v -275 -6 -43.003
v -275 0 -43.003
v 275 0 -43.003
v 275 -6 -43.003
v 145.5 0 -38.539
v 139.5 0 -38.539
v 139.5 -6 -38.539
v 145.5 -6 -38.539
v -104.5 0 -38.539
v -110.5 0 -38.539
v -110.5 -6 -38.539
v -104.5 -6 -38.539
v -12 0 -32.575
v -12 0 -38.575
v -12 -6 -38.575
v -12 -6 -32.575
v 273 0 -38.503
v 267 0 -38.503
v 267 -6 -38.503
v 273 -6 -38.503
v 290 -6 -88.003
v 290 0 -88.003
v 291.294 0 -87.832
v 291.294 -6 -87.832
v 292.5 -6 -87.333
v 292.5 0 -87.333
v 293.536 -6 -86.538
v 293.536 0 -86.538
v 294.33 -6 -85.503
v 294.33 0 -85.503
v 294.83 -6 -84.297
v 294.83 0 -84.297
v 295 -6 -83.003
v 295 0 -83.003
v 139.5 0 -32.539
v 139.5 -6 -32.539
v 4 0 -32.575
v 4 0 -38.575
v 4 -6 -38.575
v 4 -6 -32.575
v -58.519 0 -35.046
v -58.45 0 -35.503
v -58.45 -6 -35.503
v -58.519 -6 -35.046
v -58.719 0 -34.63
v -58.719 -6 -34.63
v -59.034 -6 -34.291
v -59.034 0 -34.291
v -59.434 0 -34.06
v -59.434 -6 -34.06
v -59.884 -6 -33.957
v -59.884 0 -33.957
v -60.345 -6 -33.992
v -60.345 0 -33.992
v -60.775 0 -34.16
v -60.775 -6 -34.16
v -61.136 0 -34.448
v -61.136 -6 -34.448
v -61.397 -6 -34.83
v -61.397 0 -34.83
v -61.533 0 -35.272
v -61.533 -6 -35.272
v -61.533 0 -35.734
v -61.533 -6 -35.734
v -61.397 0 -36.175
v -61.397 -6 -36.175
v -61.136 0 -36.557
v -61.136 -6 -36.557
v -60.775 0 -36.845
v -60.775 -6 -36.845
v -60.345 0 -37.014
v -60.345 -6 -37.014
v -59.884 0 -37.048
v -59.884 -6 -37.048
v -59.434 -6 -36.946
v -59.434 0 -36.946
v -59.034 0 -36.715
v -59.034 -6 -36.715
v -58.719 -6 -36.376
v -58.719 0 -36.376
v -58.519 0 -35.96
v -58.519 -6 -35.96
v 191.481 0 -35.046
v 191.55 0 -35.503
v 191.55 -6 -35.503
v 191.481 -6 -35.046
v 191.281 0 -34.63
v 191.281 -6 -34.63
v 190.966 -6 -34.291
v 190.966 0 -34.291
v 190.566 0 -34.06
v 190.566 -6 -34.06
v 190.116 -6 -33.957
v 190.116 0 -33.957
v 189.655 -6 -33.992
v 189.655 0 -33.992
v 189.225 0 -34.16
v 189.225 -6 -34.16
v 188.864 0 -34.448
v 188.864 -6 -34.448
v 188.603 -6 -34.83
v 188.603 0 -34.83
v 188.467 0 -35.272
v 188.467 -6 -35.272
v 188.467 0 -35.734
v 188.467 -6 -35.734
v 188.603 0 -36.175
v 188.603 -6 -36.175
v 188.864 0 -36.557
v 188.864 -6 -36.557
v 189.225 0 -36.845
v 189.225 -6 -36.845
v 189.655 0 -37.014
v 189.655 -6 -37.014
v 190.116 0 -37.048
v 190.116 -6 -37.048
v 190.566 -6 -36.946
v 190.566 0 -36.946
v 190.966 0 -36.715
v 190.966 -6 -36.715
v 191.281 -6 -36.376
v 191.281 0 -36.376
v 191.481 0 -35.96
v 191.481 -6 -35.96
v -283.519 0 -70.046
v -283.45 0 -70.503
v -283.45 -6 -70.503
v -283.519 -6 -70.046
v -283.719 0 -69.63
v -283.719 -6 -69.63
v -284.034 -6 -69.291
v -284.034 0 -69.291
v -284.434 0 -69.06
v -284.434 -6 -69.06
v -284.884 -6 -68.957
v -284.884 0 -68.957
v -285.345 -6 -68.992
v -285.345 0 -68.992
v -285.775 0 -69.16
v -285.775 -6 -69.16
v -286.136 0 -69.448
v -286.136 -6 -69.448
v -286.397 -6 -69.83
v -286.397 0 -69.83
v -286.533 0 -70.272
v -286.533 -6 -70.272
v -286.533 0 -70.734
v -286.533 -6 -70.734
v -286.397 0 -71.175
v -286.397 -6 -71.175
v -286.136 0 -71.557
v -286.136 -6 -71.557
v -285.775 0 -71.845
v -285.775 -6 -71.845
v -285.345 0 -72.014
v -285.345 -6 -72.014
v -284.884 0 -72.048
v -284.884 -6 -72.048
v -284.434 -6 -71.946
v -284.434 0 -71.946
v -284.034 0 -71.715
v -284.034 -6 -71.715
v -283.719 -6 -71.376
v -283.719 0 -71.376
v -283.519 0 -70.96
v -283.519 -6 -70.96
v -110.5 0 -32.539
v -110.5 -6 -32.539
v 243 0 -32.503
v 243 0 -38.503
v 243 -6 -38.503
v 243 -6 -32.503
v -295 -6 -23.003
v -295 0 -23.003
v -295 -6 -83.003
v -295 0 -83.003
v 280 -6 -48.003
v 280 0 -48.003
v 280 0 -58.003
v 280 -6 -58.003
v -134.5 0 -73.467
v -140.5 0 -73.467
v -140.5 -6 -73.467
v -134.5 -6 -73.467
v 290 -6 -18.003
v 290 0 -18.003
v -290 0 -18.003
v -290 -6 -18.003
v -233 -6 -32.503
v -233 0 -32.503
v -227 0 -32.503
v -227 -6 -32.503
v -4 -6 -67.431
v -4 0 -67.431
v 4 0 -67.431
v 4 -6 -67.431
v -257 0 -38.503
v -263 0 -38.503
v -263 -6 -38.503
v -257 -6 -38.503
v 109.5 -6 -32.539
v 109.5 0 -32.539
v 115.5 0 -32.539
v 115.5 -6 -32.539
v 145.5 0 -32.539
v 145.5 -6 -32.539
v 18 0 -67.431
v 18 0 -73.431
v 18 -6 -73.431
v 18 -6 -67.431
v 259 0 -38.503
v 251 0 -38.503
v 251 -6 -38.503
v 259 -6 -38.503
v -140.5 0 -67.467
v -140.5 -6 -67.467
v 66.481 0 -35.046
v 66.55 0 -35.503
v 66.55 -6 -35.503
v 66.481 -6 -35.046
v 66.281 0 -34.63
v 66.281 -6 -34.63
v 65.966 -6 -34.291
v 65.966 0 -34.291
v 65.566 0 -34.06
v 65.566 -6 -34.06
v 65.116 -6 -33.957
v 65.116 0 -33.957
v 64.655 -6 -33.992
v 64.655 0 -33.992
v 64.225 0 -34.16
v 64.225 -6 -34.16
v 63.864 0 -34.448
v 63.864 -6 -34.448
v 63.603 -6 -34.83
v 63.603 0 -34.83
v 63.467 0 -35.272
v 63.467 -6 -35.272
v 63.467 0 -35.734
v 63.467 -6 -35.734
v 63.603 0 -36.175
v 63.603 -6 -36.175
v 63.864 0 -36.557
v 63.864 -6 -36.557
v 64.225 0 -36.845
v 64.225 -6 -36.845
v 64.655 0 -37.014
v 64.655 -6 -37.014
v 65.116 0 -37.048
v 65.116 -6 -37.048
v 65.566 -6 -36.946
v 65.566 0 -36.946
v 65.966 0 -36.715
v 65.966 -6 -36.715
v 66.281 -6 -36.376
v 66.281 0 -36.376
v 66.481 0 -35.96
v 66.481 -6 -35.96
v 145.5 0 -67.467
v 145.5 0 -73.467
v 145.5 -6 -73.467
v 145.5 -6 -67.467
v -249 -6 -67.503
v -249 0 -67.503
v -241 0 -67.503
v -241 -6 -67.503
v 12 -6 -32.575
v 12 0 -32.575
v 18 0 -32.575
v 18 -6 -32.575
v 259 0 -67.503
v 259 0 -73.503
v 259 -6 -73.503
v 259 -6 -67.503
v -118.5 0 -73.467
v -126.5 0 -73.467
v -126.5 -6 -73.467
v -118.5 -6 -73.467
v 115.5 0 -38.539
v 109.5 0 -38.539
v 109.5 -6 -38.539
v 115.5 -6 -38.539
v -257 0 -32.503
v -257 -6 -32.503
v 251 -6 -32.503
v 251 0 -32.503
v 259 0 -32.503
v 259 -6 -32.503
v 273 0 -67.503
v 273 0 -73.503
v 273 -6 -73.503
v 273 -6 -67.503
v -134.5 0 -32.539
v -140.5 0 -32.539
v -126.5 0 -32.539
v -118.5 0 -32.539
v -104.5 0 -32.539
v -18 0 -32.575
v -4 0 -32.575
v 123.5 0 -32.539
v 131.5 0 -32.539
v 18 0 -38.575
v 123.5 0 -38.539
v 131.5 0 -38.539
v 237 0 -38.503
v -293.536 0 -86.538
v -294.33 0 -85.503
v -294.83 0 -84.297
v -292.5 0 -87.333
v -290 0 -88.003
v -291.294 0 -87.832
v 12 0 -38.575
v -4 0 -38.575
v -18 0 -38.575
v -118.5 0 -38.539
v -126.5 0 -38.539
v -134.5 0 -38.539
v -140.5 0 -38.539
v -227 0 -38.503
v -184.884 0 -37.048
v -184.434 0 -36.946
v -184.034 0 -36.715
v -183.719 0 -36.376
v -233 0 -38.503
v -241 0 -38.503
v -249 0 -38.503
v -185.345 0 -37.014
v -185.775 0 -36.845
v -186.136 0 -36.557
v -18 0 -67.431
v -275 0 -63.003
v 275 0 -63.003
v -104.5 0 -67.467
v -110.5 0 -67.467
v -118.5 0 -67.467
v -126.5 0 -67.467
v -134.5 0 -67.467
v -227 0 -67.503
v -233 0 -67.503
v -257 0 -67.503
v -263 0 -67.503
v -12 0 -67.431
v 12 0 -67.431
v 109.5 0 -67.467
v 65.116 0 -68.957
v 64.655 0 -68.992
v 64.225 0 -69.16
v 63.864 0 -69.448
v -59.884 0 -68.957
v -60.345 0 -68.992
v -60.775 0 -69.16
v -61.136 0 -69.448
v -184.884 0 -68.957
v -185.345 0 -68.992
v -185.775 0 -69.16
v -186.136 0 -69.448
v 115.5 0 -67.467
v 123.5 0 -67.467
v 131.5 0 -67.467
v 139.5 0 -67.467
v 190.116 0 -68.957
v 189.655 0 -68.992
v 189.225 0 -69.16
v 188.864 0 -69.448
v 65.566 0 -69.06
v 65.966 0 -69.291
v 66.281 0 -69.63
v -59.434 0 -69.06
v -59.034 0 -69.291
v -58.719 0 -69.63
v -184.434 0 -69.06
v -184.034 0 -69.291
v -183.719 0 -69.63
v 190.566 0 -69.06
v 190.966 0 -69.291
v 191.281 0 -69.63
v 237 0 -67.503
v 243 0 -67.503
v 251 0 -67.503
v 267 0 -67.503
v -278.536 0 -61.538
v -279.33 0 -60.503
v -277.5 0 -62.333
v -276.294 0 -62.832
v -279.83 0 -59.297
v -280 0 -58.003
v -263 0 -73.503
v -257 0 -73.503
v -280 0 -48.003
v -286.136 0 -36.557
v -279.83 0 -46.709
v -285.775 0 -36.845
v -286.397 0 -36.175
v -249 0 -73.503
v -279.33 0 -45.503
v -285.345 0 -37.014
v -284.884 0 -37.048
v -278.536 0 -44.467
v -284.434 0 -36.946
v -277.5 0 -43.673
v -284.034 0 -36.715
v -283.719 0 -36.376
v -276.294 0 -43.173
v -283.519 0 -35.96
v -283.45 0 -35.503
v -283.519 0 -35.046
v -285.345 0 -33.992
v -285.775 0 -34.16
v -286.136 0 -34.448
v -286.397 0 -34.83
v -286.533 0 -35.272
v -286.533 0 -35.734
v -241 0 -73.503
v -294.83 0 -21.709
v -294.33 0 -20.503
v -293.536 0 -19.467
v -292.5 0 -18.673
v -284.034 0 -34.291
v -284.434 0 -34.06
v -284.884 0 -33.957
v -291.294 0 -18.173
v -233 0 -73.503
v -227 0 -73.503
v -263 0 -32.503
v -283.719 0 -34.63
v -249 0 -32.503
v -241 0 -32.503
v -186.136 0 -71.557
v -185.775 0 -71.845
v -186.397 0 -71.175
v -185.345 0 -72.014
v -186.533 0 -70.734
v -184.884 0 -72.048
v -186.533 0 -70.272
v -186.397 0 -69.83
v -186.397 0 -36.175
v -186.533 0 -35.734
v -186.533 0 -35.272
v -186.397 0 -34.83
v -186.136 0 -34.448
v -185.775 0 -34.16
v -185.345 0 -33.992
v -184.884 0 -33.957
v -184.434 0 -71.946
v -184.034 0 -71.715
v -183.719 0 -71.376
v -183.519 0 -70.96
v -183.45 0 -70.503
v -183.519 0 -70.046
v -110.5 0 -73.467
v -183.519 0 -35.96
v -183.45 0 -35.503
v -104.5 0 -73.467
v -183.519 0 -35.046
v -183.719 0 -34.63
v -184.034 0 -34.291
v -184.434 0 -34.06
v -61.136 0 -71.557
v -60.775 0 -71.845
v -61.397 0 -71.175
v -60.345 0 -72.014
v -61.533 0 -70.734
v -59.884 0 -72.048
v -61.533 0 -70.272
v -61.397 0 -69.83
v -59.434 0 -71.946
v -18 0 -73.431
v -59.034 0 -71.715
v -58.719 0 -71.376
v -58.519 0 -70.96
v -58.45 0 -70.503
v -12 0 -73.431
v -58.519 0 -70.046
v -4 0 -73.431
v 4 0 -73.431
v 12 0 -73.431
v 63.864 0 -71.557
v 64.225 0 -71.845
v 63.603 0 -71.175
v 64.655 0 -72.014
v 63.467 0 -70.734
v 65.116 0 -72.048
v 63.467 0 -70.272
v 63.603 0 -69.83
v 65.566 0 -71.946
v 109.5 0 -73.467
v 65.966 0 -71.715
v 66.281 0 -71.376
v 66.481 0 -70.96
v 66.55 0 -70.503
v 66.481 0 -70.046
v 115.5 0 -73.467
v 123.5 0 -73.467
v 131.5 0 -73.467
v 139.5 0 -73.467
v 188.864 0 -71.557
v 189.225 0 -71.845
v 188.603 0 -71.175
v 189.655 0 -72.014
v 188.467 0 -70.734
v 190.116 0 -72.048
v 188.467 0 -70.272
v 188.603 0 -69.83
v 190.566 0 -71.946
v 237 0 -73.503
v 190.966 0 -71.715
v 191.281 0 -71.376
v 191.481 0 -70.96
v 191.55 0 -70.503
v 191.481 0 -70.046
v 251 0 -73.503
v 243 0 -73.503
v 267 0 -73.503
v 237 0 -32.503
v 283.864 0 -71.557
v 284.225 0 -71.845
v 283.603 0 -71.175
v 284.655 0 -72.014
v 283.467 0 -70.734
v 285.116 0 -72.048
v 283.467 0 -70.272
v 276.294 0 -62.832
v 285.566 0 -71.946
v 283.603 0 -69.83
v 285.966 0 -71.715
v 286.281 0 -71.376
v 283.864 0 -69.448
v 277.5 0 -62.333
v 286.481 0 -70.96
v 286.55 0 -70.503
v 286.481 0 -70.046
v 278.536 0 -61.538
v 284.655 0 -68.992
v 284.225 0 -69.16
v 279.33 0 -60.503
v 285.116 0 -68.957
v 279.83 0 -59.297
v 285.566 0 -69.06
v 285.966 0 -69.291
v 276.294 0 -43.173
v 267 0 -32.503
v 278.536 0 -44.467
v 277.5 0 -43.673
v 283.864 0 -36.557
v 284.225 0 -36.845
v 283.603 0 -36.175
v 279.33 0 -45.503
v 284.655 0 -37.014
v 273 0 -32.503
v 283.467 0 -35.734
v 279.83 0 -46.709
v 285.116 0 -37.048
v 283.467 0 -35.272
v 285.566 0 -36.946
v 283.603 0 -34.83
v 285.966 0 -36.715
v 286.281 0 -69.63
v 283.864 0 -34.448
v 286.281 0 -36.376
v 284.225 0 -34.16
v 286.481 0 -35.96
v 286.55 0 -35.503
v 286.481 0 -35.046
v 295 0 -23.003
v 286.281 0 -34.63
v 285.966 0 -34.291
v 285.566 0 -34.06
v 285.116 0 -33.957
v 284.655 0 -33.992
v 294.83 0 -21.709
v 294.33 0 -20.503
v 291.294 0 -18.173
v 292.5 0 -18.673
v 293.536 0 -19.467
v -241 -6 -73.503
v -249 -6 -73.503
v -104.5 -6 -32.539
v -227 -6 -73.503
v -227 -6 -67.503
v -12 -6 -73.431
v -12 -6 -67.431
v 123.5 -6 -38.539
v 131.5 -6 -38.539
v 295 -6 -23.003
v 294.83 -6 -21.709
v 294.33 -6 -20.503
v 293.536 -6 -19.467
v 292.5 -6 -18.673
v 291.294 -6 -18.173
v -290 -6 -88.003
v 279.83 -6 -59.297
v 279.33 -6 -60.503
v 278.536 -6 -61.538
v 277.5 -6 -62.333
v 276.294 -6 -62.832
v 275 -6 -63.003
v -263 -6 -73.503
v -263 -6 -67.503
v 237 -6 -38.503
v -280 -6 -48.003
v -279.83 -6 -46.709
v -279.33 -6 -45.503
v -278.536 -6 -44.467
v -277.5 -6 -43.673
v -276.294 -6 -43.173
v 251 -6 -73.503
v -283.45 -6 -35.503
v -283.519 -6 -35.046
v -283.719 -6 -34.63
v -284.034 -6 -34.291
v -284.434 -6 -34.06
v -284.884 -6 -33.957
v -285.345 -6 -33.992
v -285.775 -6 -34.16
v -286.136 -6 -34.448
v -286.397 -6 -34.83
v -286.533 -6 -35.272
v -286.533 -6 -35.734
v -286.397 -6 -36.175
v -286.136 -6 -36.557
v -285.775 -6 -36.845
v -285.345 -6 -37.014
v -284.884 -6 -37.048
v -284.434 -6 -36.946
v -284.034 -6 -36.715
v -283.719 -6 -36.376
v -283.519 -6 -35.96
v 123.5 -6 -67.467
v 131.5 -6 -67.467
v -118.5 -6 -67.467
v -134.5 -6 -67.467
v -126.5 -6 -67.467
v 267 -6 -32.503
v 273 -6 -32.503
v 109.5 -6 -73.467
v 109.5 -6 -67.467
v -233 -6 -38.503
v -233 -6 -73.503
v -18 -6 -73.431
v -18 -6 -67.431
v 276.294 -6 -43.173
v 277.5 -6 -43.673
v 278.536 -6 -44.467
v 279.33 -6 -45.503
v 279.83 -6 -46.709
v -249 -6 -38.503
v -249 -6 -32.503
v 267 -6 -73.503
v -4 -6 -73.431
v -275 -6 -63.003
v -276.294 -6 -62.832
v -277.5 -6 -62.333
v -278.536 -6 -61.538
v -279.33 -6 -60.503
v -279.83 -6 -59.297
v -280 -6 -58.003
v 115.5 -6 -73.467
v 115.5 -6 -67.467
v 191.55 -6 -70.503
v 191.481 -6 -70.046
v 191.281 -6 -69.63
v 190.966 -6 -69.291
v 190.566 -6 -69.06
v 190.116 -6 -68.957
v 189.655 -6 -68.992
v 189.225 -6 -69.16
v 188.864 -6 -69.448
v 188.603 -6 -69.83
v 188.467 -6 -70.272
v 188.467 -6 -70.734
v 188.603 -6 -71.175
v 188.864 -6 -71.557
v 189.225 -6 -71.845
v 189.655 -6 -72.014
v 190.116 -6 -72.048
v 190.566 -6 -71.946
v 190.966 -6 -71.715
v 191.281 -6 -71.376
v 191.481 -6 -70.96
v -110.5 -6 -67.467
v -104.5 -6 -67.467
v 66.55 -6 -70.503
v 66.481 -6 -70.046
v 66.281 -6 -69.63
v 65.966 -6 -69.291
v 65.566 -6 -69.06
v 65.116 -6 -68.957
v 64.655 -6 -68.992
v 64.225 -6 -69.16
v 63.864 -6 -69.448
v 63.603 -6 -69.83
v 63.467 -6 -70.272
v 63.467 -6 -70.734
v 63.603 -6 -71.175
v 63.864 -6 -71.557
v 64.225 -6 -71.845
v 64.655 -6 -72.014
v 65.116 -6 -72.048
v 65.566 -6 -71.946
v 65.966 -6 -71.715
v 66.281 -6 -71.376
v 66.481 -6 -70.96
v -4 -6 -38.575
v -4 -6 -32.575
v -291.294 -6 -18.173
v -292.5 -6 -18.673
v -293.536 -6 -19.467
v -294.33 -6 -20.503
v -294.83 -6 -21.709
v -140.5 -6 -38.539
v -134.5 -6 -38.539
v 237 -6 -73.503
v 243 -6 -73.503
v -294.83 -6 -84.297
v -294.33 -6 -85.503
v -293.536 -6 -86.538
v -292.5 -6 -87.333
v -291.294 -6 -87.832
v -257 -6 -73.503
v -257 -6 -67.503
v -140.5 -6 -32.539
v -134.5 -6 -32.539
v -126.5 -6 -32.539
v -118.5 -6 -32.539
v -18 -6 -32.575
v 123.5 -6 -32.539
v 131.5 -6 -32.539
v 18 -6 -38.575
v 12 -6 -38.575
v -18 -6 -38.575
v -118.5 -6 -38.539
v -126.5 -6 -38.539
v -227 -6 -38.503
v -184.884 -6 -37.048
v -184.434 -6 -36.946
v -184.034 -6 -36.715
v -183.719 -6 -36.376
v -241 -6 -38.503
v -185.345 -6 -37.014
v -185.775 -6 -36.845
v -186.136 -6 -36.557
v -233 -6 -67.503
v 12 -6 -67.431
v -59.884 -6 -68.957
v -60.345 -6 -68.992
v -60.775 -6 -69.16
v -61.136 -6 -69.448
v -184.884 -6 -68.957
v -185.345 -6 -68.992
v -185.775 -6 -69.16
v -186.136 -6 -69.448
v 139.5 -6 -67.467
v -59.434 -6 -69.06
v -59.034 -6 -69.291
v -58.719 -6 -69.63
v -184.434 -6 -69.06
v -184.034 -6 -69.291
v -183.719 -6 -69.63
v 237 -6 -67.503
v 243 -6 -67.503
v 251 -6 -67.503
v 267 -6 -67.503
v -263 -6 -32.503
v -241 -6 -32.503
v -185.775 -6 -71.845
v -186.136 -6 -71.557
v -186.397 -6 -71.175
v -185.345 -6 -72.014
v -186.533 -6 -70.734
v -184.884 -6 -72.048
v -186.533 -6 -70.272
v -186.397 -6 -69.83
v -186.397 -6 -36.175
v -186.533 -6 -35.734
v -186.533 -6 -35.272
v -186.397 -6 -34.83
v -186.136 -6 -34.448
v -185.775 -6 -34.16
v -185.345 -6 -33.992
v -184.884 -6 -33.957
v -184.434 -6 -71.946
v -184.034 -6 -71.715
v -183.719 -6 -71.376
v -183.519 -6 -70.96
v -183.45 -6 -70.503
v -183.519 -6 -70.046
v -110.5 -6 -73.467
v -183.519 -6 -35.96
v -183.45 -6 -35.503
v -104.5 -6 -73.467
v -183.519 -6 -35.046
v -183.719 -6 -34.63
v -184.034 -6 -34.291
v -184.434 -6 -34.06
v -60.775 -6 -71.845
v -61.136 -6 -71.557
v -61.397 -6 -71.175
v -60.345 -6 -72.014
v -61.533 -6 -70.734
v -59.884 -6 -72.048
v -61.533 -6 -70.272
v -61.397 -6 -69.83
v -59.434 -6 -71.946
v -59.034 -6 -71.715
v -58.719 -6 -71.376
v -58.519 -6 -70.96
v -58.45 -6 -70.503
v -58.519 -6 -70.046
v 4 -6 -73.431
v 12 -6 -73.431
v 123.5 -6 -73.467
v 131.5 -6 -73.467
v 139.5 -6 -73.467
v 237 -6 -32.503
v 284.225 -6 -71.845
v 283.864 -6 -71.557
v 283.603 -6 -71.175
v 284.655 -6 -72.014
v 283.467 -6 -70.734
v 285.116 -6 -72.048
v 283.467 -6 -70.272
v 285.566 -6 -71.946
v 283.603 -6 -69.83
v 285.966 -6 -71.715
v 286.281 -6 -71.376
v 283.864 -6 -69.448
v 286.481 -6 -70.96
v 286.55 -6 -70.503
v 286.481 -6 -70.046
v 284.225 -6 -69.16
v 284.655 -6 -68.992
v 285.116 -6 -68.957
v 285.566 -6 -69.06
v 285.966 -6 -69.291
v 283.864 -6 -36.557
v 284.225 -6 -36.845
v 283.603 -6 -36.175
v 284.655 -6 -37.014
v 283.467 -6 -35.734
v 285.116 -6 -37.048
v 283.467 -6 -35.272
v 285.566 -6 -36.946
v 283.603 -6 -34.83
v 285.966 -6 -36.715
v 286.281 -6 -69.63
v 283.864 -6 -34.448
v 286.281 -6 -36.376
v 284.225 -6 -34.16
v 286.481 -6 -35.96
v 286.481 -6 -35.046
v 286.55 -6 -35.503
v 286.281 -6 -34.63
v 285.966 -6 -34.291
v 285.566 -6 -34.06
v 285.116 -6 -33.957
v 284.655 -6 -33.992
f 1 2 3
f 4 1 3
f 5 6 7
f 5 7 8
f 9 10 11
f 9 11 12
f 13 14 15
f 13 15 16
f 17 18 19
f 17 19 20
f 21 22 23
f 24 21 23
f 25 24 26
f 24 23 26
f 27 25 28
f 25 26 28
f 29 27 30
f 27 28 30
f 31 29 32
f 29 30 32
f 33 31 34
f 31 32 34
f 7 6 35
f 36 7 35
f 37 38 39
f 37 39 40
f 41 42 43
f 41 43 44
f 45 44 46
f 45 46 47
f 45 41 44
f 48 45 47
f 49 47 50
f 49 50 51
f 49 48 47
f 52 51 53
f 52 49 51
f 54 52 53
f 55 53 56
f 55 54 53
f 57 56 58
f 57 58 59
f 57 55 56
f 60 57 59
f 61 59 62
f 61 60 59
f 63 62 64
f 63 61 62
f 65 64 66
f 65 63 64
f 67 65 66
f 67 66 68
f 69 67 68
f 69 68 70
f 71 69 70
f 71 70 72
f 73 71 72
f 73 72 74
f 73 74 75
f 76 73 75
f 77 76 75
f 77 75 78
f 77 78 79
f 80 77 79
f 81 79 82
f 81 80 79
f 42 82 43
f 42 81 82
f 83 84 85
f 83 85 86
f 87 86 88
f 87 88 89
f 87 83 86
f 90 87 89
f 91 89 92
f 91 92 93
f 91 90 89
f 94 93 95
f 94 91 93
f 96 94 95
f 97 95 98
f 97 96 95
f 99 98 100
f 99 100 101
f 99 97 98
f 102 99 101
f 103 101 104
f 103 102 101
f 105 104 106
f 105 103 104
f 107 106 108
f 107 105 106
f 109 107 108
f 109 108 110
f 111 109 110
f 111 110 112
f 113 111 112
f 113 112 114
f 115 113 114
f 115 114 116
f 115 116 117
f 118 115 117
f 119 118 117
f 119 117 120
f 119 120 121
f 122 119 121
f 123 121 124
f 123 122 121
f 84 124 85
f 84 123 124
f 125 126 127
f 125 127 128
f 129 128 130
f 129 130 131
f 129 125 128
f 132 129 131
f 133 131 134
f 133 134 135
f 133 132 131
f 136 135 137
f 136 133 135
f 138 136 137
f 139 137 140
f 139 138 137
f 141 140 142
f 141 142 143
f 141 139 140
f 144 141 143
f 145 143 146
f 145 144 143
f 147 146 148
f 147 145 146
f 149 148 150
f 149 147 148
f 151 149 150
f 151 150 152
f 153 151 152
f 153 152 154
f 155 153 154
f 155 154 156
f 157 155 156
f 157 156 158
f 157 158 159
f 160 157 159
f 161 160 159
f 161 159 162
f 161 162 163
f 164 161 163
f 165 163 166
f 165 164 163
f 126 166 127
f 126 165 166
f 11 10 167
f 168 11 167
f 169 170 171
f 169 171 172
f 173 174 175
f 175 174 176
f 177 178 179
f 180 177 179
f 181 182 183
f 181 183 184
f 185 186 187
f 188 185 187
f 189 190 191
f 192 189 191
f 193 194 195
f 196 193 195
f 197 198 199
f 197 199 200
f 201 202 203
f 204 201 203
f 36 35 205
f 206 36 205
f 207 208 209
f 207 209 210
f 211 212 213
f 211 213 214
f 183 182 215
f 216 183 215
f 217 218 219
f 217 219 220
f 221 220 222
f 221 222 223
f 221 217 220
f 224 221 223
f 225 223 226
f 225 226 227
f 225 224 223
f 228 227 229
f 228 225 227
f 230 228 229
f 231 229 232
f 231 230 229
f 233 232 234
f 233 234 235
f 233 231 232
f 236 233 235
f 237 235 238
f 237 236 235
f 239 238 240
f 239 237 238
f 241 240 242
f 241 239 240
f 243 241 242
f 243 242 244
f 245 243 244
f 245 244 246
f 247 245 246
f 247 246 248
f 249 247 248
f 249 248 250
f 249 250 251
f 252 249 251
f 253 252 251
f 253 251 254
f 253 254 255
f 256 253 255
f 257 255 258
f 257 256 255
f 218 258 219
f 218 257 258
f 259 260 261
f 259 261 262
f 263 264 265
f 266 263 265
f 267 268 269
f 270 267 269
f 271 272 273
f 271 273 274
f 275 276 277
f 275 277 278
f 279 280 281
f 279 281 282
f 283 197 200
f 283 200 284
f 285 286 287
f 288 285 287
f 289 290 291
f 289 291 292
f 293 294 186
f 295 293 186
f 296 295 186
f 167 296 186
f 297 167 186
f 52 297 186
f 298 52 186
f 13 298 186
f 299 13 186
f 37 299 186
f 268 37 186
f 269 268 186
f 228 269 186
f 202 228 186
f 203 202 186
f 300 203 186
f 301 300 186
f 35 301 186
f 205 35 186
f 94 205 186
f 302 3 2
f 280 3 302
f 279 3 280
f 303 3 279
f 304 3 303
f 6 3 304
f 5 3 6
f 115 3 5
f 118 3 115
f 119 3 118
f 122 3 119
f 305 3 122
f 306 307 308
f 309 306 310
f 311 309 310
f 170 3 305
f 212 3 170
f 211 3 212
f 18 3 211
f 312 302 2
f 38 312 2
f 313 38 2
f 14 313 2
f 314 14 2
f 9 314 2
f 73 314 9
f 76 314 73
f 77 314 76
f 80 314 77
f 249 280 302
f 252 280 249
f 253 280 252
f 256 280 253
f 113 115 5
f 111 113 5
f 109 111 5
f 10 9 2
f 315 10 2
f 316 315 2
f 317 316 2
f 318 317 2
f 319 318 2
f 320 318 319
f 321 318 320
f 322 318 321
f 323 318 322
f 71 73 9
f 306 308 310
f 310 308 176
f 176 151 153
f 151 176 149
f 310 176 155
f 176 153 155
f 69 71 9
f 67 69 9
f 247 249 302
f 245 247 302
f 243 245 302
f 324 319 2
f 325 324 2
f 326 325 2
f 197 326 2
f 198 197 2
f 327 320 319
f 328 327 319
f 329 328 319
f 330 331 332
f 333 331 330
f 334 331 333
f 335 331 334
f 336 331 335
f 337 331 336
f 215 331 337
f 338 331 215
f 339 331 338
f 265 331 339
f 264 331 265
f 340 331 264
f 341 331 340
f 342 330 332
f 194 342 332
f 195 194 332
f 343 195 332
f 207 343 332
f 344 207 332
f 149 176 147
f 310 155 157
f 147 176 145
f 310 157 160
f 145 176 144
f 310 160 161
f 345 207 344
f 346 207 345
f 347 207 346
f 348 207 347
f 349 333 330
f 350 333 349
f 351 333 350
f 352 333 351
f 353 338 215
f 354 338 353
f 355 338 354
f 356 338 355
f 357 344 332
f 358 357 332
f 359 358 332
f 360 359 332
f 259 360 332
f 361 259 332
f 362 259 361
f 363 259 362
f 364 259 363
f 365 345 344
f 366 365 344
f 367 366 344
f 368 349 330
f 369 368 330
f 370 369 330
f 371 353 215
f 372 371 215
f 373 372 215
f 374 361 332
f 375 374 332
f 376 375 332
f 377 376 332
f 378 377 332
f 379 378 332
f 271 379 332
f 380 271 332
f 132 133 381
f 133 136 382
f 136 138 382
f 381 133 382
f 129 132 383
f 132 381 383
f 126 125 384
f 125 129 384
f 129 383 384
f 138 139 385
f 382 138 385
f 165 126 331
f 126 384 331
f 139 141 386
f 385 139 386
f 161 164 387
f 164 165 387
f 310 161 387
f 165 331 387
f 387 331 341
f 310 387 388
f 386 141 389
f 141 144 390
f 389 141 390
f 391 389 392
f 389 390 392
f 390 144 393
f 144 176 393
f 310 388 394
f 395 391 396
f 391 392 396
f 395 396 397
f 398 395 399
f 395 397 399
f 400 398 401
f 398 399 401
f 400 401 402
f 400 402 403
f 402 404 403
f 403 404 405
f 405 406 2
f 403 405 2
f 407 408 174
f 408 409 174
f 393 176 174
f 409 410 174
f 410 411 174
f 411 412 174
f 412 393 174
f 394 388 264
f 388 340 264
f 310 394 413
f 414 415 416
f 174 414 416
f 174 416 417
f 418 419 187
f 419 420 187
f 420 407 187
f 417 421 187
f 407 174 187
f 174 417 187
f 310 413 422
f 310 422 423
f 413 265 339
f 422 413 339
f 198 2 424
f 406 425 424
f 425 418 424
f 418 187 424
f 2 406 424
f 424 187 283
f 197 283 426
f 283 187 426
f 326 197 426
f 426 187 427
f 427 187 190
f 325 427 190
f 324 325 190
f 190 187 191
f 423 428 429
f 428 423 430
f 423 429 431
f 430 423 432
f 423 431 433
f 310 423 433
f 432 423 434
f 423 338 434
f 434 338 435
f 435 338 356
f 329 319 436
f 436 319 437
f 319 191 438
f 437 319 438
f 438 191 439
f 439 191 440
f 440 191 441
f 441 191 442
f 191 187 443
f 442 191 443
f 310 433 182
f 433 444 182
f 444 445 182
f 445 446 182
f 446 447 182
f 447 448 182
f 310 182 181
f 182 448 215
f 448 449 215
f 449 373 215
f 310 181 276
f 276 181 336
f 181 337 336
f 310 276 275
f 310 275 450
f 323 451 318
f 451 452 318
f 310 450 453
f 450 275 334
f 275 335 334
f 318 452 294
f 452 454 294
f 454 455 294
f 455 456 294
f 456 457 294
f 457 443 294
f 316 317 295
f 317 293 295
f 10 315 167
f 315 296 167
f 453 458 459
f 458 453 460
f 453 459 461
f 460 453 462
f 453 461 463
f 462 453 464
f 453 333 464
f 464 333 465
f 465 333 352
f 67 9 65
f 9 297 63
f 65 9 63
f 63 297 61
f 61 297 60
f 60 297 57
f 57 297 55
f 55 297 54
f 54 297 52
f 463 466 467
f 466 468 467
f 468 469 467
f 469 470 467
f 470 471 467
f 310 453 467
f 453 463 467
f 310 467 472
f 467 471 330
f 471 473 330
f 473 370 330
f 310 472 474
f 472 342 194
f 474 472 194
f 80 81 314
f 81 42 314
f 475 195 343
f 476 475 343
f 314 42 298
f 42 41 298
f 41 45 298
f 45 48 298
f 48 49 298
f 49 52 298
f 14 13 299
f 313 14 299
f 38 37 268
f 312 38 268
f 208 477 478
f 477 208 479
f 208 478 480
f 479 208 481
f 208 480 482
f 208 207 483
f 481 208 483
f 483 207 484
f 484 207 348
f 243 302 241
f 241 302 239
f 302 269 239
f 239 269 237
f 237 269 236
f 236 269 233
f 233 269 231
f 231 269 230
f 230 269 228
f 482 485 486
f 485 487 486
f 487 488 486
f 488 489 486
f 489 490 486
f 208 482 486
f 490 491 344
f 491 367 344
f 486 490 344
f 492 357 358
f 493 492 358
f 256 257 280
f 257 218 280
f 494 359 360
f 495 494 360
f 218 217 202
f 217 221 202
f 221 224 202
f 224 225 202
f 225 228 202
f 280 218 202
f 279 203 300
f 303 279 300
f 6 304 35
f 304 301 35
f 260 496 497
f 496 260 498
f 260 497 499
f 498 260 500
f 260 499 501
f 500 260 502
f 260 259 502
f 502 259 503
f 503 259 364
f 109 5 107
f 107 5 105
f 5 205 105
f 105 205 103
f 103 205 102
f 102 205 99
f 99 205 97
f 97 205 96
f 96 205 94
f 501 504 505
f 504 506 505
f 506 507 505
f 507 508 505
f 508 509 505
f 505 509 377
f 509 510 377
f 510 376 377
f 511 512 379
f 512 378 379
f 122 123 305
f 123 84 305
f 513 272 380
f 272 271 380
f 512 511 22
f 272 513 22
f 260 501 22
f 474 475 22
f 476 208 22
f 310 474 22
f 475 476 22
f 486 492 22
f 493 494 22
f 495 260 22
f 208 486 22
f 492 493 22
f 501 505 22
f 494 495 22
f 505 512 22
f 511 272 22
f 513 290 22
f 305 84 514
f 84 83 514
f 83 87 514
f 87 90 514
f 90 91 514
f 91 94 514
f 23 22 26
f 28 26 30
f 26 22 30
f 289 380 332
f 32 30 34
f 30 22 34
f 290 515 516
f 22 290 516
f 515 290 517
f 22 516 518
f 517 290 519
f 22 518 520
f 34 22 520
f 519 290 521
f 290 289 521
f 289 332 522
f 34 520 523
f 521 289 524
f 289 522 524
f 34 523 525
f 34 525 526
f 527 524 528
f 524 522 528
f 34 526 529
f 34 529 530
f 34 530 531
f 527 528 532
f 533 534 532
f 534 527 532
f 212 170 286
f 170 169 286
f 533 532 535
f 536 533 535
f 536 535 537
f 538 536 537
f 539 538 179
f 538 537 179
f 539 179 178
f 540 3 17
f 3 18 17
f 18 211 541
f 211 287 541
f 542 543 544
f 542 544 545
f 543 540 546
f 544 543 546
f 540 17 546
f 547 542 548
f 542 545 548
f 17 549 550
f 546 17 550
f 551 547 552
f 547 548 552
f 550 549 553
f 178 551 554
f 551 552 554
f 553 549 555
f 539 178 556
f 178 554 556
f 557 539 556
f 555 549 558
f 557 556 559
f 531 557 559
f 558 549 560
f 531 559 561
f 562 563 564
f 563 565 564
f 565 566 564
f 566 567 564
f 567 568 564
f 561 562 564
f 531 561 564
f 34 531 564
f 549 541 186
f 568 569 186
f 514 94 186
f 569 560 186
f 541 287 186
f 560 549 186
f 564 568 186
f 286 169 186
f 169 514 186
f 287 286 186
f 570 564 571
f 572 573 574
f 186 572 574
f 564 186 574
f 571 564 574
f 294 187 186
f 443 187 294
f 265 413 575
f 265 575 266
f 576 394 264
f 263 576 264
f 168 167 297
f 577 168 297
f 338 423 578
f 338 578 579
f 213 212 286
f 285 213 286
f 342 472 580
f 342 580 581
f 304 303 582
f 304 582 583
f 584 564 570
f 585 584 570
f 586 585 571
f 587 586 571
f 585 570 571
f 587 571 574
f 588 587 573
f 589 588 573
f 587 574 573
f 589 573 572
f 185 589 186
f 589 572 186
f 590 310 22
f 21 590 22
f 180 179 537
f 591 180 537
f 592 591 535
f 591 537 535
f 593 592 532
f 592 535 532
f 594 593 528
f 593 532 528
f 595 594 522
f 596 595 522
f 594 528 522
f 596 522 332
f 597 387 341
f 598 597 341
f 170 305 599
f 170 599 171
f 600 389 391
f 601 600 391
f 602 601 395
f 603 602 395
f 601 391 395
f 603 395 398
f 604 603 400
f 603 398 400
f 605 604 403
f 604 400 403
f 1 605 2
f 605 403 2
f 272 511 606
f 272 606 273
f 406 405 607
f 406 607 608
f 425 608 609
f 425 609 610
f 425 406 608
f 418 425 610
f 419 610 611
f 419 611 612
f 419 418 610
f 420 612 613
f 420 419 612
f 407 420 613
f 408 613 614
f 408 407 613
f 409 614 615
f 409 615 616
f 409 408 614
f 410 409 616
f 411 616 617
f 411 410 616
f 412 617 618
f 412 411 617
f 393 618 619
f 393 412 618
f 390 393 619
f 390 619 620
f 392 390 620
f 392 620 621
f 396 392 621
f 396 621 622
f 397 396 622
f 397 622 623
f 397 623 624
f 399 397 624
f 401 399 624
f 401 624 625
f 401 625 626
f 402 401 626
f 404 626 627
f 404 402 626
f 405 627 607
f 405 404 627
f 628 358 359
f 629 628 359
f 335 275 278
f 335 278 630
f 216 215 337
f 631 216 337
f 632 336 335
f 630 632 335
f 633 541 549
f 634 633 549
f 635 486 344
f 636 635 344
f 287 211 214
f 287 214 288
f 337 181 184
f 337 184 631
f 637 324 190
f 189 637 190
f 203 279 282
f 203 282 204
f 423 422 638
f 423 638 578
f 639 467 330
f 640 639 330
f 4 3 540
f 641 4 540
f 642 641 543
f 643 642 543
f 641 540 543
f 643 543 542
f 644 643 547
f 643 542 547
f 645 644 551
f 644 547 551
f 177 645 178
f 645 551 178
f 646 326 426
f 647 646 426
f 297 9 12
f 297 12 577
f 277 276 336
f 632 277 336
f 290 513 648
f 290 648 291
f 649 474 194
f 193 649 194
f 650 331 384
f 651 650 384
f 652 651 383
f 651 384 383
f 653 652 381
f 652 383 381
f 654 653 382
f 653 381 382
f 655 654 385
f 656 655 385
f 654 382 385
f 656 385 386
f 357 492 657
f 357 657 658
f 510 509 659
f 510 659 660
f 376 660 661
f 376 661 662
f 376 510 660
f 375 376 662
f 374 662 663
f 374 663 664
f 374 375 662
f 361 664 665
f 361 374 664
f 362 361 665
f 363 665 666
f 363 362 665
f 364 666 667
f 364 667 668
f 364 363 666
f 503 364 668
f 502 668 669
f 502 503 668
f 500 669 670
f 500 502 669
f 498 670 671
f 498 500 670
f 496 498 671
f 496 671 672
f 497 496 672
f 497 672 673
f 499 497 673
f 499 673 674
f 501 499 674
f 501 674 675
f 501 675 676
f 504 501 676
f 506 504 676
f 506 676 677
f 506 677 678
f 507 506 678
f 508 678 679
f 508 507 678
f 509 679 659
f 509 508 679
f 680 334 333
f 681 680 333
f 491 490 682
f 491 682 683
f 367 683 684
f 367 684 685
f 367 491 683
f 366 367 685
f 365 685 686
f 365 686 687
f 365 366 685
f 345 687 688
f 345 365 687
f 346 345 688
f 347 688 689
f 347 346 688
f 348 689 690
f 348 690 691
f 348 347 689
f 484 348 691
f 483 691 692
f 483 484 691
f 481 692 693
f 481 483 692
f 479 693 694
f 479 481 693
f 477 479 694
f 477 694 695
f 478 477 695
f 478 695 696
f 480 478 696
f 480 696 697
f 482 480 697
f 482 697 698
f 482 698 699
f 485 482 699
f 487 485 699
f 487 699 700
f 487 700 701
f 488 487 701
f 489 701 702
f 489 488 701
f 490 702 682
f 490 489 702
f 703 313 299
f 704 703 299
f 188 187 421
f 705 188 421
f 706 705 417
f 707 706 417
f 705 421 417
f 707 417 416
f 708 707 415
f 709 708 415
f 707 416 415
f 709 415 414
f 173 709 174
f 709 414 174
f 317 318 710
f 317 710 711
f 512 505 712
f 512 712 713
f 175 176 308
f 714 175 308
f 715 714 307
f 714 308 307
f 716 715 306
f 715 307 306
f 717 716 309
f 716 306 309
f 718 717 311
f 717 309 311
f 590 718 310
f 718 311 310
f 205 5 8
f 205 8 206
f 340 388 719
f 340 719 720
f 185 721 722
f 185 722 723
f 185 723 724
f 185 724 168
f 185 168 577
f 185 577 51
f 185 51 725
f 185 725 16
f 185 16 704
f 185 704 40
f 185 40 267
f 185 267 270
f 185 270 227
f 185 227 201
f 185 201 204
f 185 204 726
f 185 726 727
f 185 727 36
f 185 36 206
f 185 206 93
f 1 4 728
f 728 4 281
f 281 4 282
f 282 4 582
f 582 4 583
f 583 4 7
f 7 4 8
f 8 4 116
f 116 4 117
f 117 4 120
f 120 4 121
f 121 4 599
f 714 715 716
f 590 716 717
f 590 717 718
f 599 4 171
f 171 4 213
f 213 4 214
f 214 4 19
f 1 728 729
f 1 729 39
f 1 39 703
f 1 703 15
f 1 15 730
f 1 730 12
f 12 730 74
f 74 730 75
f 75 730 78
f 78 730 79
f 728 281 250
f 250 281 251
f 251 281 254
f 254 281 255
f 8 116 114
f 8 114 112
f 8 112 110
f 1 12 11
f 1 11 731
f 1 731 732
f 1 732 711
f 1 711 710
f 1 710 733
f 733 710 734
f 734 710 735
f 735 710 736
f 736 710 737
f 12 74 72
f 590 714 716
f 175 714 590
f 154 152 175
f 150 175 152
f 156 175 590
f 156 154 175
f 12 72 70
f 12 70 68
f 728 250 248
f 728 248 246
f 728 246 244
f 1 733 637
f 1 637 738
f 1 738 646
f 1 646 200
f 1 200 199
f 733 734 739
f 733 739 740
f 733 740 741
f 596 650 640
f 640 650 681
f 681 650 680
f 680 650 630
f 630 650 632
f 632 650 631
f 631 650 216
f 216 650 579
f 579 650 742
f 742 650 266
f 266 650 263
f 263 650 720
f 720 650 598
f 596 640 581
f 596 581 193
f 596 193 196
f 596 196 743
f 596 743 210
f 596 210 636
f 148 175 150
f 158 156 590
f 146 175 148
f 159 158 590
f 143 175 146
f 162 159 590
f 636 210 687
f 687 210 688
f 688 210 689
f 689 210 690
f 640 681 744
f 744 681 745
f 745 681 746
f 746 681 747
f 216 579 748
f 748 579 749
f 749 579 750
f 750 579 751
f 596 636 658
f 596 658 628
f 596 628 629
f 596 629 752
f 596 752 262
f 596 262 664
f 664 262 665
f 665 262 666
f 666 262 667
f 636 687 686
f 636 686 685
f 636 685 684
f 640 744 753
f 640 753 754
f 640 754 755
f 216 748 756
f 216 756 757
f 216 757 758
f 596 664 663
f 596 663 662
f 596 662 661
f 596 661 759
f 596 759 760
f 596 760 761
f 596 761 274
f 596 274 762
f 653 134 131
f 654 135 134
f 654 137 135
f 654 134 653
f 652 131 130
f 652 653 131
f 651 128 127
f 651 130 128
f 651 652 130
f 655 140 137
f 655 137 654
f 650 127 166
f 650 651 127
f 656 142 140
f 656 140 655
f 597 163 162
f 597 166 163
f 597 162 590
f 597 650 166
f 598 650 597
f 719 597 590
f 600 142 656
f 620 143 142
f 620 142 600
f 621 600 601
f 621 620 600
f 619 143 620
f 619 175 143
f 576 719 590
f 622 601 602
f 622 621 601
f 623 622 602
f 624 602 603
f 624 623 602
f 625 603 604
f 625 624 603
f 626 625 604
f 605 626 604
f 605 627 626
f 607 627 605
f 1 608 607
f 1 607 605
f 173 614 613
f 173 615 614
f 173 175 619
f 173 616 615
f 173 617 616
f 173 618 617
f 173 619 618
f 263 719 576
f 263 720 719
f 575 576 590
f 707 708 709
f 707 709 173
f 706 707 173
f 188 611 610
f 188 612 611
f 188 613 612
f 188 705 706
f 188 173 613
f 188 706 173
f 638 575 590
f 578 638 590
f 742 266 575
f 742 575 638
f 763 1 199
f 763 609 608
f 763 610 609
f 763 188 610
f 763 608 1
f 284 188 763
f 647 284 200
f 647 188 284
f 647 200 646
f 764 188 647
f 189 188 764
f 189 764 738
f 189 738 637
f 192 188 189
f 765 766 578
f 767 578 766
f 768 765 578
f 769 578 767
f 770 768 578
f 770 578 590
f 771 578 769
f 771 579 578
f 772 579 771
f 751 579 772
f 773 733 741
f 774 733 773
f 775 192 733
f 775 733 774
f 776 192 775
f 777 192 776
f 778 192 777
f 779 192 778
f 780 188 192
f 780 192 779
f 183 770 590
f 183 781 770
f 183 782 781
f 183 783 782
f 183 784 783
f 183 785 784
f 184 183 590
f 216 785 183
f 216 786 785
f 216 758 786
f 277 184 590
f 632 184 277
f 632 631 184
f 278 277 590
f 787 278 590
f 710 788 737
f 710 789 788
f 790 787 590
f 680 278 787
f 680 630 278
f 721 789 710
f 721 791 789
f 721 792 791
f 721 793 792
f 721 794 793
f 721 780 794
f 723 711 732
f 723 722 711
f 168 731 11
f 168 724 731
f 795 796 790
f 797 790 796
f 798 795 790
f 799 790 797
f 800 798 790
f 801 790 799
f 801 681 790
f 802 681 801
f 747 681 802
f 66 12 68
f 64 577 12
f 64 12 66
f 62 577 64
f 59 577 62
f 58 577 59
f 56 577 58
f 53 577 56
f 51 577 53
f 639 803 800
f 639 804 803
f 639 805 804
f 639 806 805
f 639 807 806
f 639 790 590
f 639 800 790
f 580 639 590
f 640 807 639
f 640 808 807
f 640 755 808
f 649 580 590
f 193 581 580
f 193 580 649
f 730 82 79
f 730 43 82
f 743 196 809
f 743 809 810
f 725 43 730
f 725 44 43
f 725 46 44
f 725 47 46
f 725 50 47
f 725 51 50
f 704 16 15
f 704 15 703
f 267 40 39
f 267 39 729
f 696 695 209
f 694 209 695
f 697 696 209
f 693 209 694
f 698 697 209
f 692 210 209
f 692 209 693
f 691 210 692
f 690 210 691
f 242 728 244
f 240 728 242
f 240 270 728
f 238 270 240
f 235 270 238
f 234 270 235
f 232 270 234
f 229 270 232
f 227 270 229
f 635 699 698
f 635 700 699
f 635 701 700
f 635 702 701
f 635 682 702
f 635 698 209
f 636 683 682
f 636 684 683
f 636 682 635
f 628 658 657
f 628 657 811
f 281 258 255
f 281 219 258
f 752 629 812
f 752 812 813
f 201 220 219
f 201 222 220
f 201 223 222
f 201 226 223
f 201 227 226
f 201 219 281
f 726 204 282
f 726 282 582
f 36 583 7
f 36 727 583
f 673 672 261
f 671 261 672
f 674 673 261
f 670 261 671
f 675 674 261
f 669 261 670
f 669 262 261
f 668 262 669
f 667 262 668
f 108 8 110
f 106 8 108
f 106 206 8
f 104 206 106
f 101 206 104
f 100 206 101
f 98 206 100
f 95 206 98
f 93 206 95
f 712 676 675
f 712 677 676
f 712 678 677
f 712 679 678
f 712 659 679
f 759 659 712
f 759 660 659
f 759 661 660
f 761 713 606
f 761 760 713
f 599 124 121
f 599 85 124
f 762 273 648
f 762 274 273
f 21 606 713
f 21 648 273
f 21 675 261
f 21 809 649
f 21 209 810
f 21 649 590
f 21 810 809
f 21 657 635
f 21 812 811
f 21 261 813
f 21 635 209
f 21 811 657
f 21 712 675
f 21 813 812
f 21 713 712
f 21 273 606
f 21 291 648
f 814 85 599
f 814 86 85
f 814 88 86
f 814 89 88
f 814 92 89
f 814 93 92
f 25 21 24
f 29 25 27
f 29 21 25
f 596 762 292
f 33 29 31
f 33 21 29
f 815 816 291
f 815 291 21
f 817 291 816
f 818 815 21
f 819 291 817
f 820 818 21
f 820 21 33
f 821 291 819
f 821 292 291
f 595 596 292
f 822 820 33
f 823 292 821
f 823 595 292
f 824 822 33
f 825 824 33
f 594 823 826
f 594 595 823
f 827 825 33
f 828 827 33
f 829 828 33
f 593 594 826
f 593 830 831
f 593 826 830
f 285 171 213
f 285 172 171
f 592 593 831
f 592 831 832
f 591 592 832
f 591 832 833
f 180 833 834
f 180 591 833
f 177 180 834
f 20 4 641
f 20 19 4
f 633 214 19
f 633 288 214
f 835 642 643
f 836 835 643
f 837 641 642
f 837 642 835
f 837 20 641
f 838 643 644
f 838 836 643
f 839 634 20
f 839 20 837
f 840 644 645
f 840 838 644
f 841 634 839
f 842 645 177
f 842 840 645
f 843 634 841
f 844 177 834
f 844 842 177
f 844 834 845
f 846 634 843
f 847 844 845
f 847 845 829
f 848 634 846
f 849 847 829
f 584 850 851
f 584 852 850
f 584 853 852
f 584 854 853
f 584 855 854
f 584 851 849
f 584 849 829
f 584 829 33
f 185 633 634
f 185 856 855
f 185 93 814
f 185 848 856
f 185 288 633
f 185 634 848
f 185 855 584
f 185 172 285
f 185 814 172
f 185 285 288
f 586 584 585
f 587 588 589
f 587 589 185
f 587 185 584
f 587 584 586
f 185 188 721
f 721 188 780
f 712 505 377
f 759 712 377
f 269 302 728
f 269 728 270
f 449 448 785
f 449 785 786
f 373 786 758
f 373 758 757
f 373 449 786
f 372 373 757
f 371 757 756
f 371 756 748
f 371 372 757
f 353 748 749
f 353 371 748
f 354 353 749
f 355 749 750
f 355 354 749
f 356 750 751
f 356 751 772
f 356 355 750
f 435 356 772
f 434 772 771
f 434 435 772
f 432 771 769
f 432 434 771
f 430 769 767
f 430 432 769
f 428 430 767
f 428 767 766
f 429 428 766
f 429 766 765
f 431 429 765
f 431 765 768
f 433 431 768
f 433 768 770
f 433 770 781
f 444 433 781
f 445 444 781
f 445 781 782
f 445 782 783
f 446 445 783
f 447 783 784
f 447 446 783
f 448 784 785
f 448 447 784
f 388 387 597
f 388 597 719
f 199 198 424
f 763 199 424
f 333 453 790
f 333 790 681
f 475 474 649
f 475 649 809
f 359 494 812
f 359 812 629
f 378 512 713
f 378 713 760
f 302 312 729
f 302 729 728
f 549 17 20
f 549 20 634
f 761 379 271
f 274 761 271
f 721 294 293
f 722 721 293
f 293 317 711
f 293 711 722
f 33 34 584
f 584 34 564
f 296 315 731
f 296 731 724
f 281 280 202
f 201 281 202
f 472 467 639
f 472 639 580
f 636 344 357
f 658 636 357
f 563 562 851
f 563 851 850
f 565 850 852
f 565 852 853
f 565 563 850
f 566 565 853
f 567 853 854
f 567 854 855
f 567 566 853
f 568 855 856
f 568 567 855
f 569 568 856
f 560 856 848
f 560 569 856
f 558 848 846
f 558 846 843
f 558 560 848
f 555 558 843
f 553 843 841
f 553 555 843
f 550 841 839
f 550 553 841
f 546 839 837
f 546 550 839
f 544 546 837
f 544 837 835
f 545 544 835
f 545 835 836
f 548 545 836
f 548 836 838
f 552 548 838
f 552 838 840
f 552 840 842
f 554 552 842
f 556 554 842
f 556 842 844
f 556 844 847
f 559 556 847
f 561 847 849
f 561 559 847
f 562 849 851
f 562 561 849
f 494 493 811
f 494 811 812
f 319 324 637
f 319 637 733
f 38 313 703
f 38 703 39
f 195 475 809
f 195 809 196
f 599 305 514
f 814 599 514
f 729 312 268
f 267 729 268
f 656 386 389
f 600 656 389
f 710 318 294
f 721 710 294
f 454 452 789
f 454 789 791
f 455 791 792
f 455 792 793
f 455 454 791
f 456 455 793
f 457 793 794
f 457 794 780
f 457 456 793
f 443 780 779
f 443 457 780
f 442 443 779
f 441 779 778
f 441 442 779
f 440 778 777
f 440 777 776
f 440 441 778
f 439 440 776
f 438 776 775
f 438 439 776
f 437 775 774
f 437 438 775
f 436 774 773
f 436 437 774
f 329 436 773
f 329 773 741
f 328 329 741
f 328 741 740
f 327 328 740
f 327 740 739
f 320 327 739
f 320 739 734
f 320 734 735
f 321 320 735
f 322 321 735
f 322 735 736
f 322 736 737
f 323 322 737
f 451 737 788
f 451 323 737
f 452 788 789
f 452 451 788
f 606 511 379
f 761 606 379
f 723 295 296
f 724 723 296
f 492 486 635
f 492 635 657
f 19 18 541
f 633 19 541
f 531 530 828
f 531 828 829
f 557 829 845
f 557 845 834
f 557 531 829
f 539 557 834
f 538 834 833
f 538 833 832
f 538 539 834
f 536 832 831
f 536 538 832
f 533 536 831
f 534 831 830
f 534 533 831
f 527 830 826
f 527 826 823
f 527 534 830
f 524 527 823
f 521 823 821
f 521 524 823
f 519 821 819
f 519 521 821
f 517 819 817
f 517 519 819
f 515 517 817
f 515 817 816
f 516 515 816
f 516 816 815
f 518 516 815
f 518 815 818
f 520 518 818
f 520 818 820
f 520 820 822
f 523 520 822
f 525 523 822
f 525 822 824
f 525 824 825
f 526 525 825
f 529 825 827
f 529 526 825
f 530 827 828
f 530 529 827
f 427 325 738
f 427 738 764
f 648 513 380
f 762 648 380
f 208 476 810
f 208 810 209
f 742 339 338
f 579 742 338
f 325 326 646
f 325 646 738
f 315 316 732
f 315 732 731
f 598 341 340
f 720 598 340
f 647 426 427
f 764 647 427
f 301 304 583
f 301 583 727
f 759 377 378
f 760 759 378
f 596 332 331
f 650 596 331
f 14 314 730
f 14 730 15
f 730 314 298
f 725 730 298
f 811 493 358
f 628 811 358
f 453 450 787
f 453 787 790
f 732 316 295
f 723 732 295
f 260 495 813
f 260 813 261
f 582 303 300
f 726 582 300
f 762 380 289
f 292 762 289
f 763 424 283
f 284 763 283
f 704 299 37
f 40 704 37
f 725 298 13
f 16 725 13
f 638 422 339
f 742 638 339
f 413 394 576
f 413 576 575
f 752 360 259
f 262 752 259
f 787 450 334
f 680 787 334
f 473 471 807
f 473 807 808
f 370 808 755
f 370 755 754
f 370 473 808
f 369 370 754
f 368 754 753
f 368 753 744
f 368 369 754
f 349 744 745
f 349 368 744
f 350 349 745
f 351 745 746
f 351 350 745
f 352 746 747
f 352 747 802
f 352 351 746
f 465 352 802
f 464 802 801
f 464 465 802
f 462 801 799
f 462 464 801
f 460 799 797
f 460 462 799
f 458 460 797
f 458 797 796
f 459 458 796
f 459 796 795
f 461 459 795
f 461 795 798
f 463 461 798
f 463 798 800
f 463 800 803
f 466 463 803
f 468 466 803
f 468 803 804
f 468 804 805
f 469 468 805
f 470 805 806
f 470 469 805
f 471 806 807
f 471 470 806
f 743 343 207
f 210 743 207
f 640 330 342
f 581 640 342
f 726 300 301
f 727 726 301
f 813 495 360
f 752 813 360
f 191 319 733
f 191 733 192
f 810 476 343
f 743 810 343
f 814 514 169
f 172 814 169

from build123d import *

# Parameters (mm, degrees)
F0_R     = 1.55
F0_W     = 6
F0_H     = 6
F0_W_2   = 8
F1_DEPTH = 6


with BuildPart() as f1:
    # F0 (on Front) → F1 (new body)
    with BuildSketch(Plane.XZ):
        with BuildLine():
            Line((-295, -23.00274), (-295, -83.00274))
            ThreePointArc((-295, -83.00274), (-293.535534, -86.538274), (-290, -88.00274))
            Line((-290, -88.00274), (290, -88.00274))
            ThreePointArc((290, -88.00274), (293.535534, -86.538274), (295, -83.00274))
            Line((295, -83.00274), (295, -23.00274))
            ThreePointArc((295, -23.00274), (293.535534, -19.467206), (290, -18.00274))
            Line((290, -18.00274), (-290, -18.00274))
            ThreePointArc((-290, -18.00274), (-293.535534, -19.467206), (-295, -23.00274))
        make_face()
        with Locations((-285, -70.50274)):
            Circle(F0_R, mode=Mode.SUBTRACT)
        with Locations((-260, -70.50274)):
            Rectangle(F0_W, F0_H, mode=Mode.SUBTRACT)
        with Locations((-245, -70.50274)):
            Rectangle(F0_W_2, F0_H, mode=Mode.SUBTRACT)
        with Locations((-230, -70.50274)):
            Rectangle(F0_W, F0_H, mode=Mode.SUBTRACT)
        with Locations((-185, -70.50274)):
            Circle(F0_R, mode=Mode.SUBTRACT)
        with Locations((-60, -70.50274)):
            Circle(F0_R, mode=Mode.SUBTRACT)
        with Locations((-137.5, -70.46684)):
            Rectangle(F0_W, F0_H, mode=Mode.SUBTRACT)
        with Locations((-122.5, -70.46684)):
            Rectangle(F0_W_2, F0_H, mode=Mode.SUBTRACT)
        with Locations((-107.5, -70.46684)):
            Rectangle(F0_W, F0_H, mode=Mode.SUBTRACT)
        with Locations((-15, -70.430941)):
            Rectangle(F0_W, F0_H, mode=Mode.SUBTRACT)
        with Locations((65, -70.50274)):
            Circle(F0_R, mode=Mode.SUBTRACT)
        with Locations((190, -70.50274)):
            Circle(F0_R, mode=Mode.SUBTRACT)
        with Locations((240, -70.50274)):
            Rectangle(F0_W, F0_H, mode=Mode.SUBTRACT)
        with Locations((255, -70.50274)):
            Rectangle(F0_W_2, F0_H, mode=Mode.SUBTRACT)
        with Locations((270, -70.50274)):
            Rectangle(F0_W, F0_H, mode=Mode.SUBTRACT)
        with Locations((285, -70.50274)):
            Circle(F0_R, mode=Mode.SUBTRACT)
        with Locations((0, -70.430941)):
            Rectangle(F0_W_2, F0_H, mode=Mode.SUBTRACT)
        with Locations((15, -70.430941)):
            Rectangle(F0_W, F0_H, mode=Mode.SUBTRACT)
        with Locations((112.5, -70.46684)):
            Rectangle(F0_W, F0_H, mode=Mode.SUBTRACT)
        with Locations((127.5, -70.46684)):
            Rectangle(F0_W_2, F0_H, mode=Mode.SUBTRACT)
        with Locations((142.5, -70.46684)):
            Rectangle(F0_W, F0_H, mode=Mode.SUBTRACT)
        with BuildLine():
            ThreePointArc((-280, -48.00274), (-278.535534, -44.467206), (-275, -43.00274))
            Line((-275, -43.00274), (275, -43.00274))
            ThreePointArc((275, -43.00274), (278.535534, -44.467206), (280, -48.00274))
            Line((280, -48.00274), (280, -58.00274))
            ThreePointArc((280, -58.00274), (278.535534, -61.538274), (275, -63.00274))
            Line((275, -63.00274), (-275, -63.00274))
            ThreePointArc((-275, -63.00274), (-278.535534, -61.538274), (-280, -58.00274))
            Line((-280, -58.00274), (-280, -48.00274))
        make_face(mode=Mode.SUBTRACT)
        with Locations((-285, -35.50274)):
            Circle(F0_R, mode=Mode.SUBTRACT)
        with Locations((-260, -35.50274)):
            Rectangle(F0_W, F0_H, mode=Mode.SUBTRACT)
        with Locations((-245, -35.50274)):
            Rectangle(F0_W_2, F0_H, mode=Mode.SUBTRACT)
        with Locations((-230, -35.50274)):
            Rectangle(F0_W, F0_H, mode=Mode.SUBTRACT)
        with Locations((-185, -35.50274)):
            Circle(F0_R, mode=Mode.SUBTRACT)
        with Locations((-137.5, -35.538639)):
            Rectangle(F0_W, F0_H, mode=Mode.SUBTRACT)
        with Locations((-122.5, -35.538639)):
            Rectangle(F0_W_2, F0_H, mode=Mode.SUBTRACT)
        with Locations((-107.5, -35.538639)):
            Rectangle(F0_W, F0_H, mode=Mode.SUBTRACT)
        with Locations((-60, -35.50274)):
            Circle(F0_R, mode=Mode.SUBTRACT)
        with Locations((-15, -35.574538)):
            Rectangle(F0_W, F0_H, mode=Mode.SUBTRACT)
        with Locations((0, -35.574538)):
            Rectangle(F0_W_2, F0_H, mode=Mode.SUBTRACT)
        with Locations((15, -35.574538)):
            Rectangle(F0_W, F0_H, mode=Mode.SUBTRACT)
        with Locations((65, -35.50274)):
            Circle(F0_R, mode=Mode.SUBTRACT)
        with Locations((112.5, -35.538639)):
            Rectangle(F0_W, F0_H, mode=Mode.SUBTRACT)
        with Locations((127.5, -35.538639)):
            Rectangle(F0_W_2, F0_H, mode=Mode.SUBTRACT)
        with Locations((142.5, -35.538639)):
            Rectangle(F0_W, F0_H, mode=Mode.SUBTRACT)
        with Locations((190, -35.50274)):
            Circle(F0_R, mode=Mode.SUBTRACT)
        with Locations((240, -35.50274)):
            Rectangle(F0_W, F0_H, mode=Mode.SUBTRACT)
        with Locations((255, -35.50274)):
            Rectangle(F0_W_2, F0_H, mode=Mode.SUBTRACT)
        with Locations((270, -35.50274)):
            Rectangle(F0_W, F0_H, mode=Mode.SUBTRACT)
        with Locations((285, -35.50274)):
            Circle(F0_R, mode=Mode.SUBTRACT)
    extrude(amount=F1_DEPTH)


solid = f1.part
